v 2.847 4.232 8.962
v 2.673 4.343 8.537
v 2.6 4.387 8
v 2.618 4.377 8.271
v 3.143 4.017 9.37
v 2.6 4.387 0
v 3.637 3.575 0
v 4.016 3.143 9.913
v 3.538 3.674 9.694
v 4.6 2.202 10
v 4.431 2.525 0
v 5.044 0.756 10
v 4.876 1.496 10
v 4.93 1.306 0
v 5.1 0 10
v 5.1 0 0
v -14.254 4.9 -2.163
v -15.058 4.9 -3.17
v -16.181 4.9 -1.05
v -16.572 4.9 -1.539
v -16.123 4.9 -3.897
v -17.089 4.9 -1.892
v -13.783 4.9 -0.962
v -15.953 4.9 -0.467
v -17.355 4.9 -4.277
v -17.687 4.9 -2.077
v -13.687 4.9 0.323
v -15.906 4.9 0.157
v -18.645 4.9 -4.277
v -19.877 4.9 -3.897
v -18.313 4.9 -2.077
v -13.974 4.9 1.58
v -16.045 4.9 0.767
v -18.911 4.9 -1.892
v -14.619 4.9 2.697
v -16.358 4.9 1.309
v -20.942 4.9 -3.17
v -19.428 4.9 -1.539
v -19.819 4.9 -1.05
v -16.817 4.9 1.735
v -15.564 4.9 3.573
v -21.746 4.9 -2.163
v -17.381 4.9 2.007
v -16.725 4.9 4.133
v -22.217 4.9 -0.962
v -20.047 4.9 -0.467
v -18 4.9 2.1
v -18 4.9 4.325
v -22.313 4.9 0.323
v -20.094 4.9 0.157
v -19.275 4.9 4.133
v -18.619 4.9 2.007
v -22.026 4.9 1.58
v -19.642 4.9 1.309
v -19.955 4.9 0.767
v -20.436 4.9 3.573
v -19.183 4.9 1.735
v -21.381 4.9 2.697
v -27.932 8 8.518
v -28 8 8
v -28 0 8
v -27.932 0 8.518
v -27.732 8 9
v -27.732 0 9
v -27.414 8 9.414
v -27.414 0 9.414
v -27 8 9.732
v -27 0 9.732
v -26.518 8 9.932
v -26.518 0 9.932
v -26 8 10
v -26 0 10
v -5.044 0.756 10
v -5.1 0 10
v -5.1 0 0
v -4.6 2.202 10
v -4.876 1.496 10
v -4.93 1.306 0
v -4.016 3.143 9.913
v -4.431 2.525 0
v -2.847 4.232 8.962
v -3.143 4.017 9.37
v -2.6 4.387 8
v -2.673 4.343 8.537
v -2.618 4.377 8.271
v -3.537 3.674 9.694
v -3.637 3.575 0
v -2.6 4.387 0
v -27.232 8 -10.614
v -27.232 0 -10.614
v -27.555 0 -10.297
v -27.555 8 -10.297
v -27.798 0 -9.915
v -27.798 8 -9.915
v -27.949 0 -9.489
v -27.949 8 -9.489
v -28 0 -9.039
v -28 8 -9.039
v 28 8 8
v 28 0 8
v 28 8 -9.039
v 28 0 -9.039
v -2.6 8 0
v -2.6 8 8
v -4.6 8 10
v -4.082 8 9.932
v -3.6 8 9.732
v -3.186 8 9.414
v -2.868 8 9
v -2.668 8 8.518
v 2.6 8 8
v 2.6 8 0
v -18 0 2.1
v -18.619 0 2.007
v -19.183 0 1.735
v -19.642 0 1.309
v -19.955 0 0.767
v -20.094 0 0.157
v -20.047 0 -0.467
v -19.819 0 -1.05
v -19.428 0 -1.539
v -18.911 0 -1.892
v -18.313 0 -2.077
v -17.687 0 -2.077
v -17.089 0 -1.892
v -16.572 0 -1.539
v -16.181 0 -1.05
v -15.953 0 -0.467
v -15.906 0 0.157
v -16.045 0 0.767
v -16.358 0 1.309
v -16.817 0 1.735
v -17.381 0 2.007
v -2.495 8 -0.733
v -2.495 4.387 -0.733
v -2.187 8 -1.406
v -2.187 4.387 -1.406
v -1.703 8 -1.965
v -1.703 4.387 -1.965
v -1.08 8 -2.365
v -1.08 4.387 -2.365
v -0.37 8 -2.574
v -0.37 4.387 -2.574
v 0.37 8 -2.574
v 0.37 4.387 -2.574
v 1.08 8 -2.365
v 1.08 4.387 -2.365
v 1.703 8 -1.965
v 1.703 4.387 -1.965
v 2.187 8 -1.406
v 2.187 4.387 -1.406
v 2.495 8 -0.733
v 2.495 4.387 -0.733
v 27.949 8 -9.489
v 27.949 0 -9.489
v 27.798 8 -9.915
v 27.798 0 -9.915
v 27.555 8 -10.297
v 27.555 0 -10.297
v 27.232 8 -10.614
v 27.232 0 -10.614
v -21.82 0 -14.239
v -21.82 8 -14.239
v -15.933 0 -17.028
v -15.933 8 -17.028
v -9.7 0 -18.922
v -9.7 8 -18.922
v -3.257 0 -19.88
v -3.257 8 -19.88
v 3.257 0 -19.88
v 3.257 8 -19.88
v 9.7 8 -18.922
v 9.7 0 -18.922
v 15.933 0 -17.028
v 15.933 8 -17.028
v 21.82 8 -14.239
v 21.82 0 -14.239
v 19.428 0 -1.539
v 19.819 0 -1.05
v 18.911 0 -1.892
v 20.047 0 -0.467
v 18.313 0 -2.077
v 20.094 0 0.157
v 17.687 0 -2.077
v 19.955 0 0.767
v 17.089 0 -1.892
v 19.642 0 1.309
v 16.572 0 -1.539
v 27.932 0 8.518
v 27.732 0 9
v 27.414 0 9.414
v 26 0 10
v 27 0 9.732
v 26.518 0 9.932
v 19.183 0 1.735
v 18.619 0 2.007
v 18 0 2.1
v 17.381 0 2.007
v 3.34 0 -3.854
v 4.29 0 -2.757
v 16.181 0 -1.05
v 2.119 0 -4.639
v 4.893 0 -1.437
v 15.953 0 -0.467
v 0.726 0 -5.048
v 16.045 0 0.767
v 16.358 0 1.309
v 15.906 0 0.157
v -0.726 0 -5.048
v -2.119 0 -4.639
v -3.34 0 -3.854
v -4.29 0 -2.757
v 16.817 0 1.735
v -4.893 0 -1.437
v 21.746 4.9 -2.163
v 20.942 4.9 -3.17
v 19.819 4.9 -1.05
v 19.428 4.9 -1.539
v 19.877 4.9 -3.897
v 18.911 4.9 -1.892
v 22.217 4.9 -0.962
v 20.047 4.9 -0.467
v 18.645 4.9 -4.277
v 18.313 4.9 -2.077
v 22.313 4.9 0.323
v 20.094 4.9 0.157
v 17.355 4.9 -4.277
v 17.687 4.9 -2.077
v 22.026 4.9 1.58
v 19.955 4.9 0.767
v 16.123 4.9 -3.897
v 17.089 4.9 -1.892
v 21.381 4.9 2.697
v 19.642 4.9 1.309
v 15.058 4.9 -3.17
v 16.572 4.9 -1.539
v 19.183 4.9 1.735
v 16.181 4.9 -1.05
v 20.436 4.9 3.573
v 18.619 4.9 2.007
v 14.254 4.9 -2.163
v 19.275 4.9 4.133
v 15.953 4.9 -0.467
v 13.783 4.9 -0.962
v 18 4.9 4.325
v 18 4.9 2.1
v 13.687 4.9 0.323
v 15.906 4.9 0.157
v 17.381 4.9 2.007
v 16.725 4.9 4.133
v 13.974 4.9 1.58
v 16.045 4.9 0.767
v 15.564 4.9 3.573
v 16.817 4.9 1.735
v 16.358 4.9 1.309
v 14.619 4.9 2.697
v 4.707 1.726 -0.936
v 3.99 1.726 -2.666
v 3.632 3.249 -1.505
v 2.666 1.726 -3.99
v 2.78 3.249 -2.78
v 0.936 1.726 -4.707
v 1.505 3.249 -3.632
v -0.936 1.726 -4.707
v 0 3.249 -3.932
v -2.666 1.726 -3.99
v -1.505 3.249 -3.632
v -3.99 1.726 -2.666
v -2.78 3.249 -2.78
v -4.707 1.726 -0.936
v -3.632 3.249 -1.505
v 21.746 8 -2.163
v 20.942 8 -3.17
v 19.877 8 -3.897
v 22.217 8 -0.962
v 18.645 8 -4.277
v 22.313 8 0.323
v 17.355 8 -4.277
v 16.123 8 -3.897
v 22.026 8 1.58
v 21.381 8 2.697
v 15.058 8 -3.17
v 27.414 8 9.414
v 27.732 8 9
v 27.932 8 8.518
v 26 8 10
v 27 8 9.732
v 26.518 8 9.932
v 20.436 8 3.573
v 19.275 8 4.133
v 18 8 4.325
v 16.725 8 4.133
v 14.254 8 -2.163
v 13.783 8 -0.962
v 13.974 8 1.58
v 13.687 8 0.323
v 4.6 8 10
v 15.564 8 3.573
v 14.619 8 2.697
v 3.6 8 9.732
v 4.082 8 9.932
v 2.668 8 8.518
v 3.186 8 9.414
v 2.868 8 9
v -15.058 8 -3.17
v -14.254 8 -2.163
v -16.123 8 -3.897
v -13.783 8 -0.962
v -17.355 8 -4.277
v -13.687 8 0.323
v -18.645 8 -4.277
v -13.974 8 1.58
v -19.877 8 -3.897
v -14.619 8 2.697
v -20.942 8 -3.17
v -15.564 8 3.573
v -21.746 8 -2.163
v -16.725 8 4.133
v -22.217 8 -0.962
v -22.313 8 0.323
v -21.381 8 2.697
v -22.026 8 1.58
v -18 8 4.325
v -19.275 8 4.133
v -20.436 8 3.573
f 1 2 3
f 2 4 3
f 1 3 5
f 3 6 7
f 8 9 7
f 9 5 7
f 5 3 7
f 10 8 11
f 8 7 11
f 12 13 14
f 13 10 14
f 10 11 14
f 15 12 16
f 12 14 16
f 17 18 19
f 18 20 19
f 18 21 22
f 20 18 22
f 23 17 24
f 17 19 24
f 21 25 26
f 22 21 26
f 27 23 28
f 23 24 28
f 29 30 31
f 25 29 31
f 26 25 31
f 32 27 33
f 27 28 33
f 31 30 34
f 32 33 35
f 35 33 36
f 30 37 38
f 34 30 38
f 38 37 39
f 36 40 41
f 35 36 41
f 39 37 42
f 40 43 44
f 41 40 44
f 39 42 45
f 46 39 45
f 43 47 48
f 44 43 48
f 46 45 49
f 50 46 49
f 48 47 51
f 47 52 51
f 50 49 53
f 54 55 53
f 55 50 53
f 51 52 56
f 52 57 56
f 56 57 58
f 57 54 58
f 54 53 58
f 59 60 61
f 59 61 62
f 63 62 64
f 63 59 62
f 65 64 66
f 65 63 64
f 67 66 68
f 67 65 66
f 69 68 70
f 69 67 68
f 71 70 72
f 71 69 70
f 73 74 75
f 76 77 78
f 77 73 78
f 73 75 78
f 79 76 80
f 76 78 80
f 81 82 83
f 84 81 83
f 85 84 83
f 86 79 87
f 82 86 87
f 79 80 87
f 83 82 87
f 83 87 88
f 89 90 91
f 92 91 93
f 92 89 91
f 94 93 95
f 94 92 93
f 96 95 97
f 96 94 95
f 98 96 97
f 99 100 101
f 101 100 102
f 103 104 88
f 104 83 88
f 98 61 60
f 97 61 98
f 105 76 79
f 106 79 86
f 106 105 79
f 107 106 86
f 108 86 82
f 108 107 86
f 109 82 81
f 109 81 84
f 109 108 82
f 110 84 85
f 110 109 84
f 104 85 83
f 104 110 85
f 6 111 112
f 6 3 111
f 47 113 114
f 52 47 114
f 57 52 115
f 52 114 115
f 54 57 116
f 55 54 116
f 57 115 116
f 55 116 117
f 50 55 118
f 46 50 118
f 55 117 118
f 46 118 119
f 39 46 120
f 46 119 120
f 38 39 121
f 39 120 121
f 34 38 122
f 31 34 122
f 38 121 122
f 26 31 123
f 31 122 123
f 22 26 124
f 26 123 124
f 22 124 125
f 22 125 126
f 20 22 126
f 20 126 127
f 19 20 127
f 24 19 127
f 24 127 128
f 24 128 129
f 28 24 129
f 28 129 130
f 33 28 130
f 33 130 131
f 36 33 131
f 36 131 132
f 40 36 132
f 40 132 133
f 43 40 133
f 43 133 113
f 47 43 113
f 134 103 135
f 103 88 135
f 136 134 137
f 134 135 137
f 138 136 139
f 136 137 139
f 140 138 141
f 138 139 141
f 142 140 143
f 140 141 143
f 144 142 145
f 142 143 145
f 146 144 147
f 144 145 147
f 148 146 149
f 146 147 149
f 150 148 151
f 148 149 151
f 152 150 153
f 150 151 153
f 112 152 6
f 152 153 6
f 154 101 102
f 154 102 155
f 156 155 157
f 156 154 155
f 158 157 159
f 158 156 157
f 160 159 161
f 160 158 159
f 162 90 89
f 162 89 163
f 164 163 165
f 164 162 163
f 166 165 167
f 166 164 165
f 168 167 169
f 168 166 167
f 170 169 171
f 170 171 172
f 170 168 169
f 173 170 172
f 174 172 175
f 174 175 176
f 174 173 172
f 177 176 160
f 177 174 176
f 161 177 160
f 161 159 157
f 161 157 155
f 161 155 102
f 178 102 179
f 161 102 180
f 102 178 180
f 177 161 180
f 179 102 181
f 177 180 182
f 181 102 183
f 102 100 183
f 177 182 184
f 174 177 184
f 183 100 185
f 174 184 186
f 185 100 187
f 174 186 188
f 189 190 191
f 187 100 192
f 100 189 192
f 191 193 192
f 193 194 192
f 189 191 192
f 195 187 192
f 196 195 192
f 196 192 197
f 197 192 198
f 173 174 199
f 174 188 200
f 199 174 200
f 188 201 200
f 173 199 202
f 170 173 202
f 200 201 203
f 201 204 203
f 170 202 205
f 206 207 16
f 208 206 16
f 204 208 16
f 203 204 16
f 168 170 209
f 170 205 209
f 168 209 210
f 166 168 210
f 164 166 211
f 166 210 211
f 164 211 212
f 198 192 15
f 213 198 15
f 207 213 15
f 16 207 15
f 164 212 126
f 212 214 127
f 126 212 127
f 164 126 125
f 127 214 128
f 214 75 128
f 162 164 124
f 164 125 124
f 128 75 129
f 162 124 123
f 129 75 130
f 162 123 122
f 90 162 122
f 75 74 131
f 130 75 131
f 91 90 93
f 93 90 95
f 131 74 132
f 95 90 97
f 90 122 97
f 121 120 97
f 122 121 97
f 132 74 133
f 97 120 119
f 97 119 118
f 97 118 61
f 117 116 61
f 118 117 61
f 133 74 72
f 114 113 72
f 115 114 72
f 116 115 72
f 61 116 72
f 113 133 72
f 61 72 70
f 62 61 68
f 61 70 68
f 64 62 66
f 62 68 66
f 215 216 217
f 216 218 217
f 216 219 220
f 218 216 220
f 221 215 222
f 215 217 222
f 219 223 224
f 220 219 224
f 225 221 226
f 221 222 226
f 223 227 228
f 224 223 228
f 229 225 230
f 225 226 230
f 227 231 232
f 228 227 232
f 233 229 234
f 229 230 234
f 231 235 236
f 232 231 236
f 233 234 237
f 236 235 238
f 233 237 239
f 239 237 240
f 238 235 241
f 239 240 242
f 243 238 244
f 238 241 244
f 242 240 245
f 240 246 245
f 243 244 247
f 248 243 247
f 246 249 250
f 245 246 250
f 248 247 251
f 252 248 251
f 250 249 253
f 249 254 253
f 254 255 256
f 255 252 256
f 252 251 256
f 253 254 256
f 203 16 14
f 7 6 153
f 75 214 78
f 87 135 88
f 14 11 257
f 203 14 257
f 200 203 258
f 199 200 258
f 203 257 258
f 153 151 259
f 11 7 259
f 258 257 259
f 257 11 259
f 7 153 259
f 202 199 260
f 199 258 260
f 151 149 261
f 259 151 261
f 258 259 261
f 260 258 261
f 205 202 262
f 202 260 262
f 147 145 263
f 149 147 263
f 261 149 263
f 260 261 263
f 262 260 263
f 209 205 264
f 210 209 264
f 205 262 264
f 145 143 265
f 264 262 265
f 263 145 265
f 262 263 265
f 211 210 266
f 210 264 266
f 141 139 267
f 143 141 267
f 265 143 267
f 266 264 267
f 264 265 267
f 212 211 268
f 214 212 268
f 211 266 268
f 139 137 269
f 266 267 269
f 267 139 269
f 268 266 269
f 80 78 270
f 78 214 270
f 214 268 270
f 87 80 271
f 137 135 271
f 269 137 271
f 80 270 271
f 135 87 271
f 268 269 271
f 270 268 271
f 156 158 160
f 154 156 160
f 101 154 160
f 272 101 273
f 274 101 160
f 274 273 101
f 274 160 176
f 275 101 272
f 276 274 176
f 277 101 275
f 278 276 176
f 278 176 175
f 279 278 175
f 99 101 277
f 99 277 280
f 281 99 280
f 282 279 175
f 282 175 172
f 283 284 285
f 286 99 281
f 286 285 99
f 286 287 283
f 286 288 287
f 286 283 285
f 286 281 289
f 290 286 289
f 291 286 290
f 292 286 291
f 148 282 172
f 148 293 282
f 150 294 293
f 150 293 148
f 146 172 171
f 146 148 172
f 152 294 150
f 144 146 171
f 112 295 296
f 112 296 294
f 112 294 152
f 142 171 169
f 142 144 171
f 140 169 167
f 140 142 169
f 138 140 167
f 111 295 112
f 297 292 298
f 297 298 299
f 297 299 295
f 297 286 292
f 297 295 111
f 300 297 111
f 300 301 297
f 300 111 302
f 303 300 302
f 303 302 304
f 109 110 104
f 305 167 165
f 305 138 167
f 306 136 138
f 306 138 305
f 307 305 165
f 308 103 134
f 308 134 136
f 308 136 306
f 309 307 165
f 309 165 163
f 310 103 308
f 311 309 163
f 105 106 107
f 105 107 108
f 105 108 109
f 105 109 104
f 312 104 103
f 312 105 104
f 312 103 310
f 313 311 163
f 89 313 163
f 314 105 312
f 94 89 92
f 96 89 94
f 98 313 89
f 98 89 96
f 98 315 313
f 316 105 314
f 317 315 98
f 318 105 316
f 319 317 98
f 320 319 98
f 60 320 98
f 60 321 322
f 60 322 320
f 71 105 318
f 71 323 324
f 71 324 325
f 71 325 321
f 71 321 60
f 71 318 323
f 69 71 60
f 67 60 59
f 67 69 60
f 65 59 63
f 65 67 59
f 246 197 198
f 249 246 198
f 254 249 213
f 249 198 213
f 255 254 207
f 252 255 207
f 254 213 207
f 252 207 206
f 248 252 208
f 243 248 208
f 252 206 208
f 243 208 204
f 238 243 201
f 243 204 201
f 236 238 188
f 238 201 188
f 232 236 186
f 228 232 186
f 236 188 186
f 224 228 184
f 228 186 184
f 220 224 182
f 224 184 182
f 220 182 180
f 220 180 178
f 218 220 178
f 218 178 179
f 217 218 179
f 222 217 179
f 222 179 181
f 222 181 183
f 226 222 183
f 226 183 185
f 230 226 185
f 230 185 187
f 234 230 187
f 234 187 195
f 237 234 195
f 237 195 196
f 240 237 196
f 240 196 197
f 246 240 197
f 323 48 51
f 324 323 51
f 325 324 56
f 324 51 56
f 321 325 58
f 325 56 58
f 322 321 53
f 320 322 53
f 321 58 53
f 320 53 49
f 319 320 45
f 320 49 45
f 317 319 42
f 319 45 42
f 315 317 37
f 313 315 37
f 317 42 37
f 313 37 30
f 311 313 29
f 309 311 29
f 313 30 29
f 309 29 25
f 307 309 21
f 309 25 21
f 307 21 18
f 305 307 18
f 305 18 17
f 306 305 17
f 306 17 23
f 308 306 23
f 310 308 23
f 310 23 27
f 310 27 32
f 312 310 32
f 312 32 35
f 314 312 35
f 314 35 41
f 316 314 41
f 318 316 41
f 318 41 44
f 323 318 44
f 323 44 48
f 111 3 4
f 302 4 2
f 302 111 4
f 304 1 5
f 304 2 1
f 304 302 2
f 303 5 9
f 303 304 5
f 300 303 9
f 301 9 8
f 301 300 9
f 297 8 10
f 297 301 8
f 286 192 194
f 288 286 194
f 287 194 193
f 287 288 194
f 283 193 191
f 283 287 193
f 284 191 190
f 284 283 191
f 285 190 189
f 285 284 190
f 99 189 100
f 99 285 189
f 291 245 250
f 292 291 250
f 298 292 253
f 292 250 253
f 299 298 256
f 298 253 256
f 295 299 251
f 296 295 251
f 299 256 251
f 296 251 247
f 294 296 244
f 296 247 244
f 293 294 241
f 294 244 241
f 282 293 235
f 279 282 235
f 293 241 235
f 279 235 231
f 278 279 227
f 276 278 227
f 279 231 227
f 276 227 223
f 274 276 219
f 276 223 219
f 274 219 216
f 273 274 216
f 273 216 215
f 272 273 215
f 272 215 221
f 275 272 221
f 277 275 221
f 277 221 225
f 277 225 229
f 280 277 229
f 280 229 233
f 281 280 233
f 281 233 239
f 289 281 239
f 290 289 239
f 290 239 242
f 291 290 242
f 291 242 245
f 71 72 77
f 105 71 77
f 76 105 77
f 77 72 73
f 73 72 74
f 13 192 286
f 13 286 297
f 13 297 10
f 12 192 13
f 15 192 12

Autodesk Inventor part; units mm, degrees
ref_plane "YZ Plane" through (0, 0, 0) normal (1, 0, 0) x (0, 1, 0)
ref_plane "XZ Plane" through (0, 0, 0) normal (0, 1, 0) x (-1, 0, 0)
ref_plane "XY Plane" through (0, 0, 0) normal (0, 0, 1) x (1, 0, 0)
sketch "Sketch1" plane through (0, 0, 0) normal (0, 1, 0) x (-1, 0, 0)
  line L0 (0, -28.84) -> (0, 33.04) projected
  line L1 (39.2, 0) -> (-39.2, 0) projected
  line L2 (-28, 10) -> (-28, -10)
  line L3 (28, 10) -> (28, -10)
  line L4 (-28, 10) -> (-2.6, 10)
  line L5 (-2.6, 10) -> (-2.6, 0)
  line L6 (28, 10) -> (2.6, 10)
  line L7 (2.6, 10) -> (2.6, 0)
  arc A0 (-2.6, 0) -> (2.6, 0) centre (0, 0) ccw
  arc A1 (-28, -10) -> (28, -10) centre (0, 24.2) ccw
  dimension "d0" = 5.2
  dimension "d1" = 56
  dimension "d2" = 20
  dimension "d3" = 10
  dimension "d4" = 20
extrude "Extrusion1" add sketch "Sketch1" along normal blind 8 contours A1 L2 L1 A0 L0 | L0 A0 L1 L3 A1 | L1 L2 L4 L5 | L7 L6 L3 L1
sketch "Sketch2" plane through (0, 0, 0) normal (0, 0, 1) x (1, 0, 0)
  arc A0 (5.1, 0) -> (0, 5.1) centre (0, 0) ccw
  line L0 (0, -1.2312) -> (0, 7.3875) projected
  line L1 (0, 5.1) -> (0, 0)
  line L2 (0, 0) -> (5.1, 0)
  dimension "d7" = 10.2
revolve "Revolution1" cut sketch "Sketch2" angle 360 about axis through (0, -10, 0) along (0, 1, 0)
sketch "Sketch4" plane through (0, 8, 0) normal (0, 1, 0) x (1, 0, 0)
  line L0 (0, 26) -> (0, -16) projected
  line L1 (28, -10) -> (28, 10) projected
  line L2 (39.2, 0) -> (-39.2, 0) projected
  point P0 (0, 0)
  point P1 (18, 0)
  point P2 (-18, 0)
  dimension "d9" = 10
hole "Hole1" at (18, 8, 0) at (-18, 8, 0) direction (0, -1, 0) diameter 4.2 end through all counterbore diameter 8.65 counterbore depth 3.1
fillet "Fillet1" radius 2 6 edges at (28, 4, 10) (28, 4, -10) (-28, 4, -10) (-28, 4, 10) (-2.6, 4, 10) (2.6, 4, 10)
sketch "Sketch5" plane through (0, 0, 0) normal (0, 0, 1) x (1, 0, 0)
  line L0 (4.6, 0) -> (26, 0) projected
  arc A0 (5.1, 0) -> (-5.1, 0) centre (0, 0) ccw
  line L1 (5.1, 0) -> (-5.1, 0) projected
  line L2 (-5.1, 0) -> (5.1, 0)
  point P0 (2.6, 0)
  point P1 (-2.6, 0)
  dimension "d18" = 5.1
extrude "Extrusion2" cut sketch "Sketch5" along normal blind 10
properties part number "Kameralefogov3"
